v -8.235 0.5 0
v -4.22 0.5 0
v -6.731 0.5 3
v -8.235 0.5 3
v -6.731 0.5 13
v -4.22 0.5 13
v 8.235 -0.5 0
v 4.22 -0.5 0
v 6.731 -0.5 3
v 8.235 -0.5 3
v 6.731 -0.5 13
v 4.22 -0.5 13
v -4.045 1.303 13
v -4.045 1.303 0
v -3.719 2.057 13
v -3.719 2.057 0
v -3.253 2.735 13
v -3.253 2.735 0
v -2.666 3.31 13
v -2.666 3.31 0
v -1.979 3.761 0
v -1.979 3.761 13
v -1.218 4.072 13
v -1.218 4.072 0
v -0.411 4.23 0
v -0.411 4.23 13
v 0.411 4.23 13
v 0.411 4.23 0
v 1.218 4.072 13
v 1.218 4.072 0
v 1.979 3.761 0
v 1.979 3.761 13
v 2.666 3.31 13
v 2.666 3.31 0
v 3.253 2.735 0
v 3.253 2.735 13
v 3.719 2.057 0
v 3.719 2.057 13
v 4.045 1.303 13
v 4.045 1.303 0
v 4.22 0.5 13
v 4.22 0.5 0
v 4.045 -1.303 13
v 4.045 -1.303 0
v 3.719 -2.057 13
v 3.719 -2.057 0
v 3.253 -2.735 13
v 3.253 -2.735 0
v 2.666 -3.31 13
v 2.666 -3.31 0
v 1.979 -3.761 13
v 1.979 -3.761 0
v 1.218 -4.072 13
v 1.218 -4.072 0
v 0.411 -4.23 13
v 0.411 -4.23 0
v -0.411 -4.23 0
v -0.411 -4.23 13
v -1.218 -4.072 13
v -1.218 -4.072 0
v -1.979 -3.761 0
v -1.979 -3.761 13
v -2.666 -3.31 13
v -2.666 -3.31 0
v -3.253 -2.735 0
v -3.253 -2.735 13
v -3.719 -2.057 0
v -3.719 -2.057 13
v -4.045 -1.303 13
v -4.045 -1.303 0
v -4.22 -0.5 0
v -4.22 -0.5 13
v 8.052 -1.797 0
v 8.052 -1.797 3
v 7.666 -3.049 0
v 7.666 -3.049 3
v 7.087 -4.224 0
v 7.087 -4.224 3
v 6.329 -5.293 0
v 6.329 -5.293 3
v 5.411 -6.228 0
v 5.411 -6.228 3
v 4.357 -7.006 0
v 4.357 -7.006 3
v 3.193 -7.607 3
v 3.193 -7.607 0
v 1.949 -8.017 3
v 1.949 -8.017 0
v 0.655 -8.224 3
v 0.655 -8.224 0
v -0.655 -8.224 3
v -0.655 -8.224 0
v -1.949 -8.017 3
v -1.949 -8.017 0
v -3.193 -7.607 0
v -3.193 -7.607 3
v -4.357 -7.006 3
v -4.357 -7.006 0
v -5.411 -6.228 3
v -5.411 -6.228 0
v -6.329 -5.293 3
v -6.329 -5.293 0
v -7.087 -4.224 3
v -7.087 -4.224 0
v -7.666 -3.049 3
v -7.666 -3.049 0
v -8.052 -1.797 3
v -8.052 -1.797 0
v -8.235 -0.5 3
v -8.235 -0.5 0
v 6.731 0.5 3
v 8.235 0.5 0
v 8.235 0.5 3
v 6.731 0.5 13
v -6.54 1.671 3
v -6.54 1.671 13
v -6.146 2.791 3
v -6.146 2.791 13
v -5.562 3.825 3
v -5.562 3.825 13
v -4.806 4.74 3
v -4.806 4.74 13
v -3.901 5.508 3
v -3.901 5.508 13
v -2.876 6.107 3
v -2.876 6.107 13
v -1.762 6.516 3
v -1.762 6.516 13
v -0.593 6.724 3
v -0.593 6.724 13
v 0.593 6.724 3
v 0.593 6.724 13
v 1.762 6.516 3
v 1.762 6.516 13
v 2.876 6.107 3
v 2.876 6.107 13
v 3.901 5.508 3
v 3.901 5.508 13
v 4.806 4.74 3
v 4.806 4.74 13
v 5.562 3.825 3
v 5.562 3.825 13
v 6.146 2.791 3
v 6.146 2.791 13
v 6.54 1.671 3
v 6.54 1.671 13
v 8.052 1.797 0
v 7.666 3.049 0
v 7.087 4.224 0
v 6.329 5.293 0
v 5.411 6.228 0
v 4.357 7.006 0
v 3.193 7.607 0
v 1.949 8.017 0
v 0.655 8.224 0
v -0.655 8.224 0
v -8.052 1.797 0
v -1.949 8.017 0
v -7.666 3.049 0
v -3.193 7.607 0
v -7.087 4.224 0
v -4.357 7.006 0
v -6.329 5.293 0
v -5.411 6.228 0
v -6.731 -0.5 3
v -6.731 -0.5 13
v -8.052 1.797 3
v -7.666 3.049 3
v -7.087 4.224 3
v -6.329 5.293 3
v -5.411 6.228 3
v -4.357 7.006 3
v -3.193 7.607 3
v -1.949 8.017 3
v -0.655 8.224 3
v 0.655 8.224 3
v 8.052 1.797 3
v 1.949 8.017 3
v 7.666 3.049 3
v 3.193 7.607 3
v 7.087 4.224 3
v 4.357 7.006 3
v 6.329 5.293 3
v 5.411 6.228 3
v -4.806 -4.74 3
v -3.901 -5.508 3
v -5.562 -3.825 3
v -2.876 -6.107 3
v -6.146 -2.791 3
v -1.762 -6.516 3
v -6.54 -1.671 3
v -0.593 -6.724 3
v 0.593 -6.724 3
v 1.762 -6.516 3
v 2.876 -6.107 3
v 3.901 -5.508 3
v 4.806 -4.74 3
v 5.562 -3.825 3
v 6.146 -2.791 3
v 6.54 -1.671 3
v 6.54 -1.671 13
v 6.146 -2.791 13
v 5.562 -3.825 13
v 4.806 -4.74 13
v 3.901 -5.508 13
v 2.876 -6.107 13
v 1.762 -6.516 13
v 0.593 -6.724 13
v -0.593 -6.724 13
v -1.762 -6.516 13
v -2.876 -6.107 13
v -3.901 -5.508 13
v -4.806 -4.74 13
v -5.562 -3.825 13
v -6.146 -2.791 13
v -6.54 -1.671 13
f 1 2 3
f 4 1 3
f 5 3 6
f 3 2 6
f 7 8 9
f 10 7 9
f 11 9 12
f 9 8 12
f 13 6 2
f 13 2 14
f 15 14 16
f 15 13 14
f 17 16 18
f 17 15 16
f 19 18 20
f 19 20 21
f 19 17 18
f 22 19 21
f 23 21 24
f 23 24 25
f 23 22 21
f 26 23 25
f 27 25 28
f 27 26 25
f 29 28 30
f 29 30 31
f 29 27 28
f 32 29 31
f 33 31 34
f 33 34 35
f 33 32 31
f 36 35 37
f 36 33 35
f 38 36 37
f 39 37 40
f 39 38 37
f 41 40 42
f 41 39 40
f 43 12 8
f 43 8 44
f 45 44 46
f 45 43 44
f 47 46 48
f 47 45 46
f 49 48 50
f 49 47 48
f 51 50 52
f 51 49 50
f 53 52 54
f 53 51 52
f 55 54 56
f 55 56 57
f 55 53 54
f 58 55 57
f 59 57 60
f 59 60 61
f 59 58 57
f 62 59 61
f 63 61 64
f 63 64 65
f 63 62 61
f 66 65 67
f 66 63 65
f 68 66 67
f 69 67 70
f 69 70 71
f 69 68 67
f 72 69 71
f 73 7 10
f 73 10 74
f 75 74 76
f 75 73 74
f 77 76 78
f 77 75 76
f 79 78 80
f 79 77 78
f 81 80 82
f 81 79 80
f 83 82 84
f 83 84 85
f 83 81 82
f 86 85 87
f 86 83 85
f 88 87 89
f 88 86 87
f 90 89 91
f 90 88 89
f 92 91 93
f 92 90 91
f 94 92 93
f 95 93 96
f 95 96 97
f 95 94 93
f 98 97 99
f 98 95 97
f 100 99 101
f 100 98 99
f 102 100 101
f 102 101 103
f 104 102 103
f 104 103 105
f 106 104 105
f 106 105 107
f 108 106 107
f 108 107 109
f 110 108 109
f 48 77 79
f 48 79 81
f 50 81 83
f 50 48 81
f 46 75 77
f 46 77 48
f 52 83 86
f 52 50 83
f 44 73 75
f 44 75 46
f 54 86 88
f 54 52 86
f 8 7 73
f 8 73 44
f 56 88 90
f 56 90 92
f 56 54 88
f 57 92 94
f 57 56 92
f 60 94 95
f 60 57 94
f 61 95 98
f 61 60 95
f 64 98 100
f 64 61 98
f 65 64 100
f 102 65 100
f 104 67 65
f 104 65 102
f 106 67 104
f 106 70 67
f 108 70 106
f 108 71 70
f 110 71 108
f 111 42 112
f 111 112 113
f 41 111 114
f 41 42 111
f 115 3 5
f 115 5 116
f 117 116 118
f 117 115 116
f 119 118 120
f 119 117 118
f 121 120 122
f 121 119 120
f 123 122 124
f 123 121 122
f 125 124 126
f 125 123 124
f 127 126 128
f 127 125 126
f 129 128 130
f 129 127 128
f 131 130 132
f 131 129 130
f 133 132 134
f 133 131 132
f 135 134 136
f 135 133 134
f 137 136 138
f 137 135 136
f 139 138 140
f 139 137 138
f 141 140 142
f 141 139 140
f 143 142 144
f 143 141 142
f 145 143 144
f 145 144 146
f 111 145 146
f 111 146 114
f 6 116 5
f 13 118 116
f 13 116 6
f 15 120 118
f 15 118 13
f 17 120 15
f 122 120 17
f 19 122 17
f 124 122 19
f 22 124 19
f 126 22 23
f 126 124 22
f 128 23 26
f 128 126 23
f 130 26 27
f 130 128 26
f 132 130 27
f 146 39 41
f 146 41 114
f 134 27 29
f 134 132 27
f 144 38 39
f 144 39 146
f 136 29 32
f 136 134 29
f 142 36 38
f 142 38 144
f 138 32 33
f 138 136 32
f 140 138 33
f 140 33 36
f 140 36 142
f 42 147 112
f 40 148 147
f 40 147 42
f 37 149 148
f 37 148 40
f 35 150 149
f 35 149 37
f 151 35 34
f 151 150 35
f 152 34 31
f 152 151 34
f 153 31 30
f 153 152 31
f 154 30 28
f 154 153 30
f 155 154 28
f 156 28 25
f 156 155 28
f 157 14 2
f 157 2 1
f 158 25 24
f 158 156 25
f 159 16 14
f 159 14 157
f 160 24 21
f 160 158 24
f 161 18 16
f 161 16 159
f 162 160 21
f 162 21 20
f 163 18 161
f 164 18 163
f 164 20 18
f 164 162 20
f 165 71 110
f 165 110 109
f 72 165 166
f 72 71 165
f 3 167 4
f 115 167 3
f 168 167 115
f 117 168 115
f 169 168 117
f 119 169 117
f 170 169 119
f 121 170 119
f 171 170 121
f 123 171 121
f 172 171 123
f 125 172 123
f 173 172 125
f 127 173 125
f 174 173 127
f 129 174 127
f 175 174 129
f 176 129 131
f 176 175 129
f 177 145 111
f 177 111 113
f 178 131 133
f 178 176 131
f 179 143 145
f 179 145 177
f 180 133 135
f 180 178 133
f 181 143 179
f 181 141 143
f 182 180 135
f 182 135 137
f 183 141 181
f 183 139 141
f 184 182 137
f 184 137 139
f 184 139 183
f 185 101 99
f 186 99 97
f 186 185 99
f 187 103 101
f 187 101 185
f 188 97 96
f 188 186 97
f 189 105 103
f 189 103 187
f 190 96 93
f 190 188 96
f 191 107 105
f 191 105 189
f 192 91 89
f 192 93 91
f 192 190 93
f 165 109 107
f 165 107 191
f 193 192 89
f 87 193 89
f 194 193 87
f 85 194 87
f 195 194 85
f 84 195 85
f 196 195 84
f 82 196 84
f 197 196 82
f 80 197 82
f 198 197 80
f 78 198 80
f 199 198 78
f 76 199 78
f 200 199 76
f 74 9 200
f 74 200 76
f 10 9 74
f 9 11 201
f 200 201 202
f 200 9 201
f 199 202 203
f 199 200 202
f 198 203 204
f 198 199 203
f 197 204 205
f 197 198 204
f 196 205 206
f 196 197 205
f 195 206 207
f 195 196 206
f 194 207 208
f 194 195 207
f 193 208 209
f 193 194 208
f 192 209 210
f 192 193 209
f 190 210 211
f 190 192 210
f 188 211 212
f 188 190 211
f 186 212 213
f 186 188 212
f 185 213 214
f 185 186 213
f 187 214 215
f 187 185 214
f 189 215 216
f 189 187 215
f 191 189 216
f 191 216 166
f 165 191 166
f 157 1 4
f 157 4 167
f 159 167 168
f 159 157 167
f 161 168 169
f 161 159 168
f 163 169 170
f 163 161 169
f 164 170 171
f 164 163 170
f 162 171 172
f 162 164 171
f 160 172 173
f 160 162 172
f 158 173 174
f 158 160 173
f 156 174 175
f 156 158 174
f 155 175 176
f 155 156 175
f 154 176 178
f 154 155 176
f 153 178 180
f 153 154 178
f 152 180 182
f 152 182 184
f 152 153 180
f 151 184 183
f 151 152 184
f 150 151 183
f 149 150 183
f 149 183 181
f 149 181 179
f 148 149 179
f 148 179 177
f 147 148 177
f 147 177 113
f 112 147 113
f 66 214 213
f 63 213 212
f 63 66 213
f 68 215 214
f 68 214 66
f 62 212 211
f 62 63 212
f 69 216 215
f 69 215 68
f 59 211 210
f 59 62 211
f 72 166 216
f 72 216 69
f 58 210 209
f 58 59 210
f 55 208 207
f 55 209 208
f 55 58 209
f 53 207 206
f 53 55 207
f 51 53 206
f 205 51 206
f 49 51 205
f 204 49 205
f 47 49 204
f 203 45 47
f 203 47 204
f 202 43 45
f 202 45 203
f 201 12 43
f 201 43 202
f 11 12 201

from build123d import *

# Parameters (mm, degrees)
F2_W     = 1
F2_H     = 13
F3_DEPTH = 25.4
F4_DEPTH = 25.4


with BuildPart() as f1:
    # F0 (on Front) → F1 (revolve)
    with BuildSketch(Plane.XZ):
        Polygon((-8.25, 3), (-8.25, 0), (-4.25, 0), (-4.25, 13), (-6.75, 13), (-6.75, 3), align=None)
    revolve(axis=Axis((0, 0, 6.5), (0, 0, -1)))

    # F2 (on Right) → F3 (cut)
    with BuildSketch(Plane.YZ):
        with Locations((0, 6.5)):
            Rectangle(F2_W, F2_H)
    extrude(amount=-F3_DEPTH, mode=Mode.SUBTRACT)

    # F2 (on Right) → F4 (cut)
    with BuildSketch(Plane.YZ):
        with Locations((0, 6.5)):
            Rectangle(F2_W, F2_H)
    extrude(amount=F4_DEPTH, mode=Mode.SUBTRACT)


solid = f1.part
